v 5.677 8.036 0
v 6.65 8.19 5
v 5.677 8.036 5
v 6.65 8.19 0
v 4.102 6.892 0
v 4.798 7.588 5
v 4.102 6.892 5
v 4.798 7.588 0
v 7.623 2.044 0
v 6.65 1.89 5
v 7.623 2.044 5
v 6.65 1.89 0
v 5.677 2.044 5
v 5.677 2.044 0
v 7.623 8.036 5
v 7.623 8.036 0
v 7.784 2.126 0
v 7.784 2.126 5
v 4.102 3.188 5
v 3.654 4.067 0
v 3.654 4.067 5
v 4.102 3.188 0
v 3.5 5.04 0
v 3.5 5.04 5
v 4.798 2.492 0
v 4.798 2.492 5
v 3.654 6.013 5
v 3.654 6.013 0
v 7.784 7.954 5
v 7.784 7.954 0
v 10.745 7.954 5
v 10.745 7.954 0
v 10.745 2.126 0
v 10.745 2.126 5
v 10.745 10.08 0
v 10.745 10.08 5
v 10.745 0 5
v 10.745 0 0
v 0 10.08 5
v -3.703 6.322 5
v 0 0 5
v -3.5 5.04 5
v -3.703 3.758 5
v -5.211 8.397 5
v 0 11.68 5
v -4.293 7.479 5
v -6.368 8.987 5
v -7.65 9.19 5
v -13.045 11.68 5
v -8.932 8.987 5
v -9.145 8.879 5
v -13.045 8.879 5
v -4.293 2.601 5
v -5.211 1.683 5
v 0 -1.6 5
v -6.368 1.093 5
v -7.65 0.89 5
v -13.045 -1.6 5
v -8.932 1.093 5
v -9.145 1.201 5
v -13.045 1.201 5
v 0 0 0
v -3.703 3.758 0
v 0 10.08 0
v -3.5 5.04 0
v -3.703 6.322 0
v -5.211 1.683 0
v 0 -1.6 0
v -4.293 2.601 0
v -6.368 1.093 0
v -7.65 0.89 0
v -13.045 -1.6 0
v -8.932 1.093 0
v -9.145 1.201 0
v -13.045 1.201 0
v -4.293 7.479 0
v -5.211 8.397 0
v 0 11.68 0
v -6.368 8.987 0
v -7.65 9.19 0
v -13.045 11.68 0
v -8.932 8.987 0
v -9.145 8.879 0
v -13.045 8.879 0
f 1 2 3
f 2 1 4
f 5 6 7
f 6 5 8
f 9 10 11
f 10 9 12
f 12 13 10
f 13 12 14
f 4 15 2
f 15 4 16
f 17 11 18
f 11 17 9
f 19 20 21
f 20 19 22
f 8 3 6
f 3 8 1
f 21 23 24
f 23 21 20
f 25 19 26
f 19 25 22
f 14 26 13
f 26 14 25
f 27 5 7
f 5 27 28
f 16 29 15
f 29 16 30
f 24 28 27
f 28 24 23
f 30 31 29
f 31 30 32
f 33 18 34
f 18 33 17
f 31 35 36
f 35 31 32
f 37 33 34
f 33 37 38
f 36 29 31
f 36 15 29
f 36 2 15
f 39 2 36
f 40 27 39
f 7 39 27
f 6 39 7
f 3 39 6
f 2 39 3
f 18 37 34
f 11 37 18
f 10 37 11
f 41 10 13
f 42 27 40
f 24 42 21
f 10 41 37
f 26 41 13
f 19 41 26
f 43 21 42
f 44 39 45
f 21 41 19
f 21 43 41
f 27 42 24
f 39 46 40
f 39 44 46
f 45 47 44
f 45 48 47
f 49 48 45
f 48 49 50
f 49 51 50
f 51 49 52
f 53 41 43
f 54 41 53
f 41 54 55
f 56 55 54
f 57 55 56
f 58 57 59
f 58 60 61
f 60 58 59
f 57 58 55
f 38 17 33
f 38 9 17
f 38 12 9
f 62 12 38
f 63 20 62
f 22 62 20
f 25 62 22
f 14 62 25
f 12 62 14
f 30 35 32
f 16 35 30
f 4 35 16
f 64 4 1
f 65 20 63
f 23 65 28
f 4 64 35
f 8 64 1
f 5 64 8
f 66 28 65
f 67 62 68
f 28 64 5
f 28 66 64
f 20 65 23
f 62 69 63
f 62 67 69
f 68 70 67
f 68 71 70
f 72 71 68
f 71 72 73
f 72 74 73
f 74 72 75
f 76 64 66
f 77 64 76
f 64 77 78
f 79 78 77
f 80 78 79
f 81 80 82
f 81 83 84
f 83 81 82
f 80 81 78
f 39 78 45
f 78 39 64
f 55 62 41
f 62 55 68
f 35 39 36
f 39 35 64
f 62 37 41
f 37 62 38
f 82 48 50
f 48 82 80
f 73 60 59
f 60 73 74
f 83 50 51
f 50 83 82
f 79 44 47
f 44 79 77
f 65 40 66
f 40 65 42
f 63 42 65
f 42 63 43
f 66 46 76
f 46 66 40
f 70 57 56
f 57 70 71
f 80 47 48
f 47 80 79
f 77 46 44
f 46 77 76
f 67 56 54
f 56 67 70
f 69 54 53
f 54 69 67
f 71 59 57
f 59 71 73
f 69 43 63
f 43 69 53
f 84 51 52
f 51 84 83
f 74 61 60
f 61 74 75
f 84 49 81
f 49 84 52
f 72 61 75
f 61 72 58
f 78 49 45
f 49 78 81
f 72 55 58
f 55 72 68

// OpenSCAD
// diameter of the first or smaller chord
diameter1 = 6;

// diameter of the second or larger chord
diameter2 = 8;

// spacing between the 2 chords
offsetVal = 7;

// Thickness of part
thickness = 5;

// Thickness of bending snap fit
clampthickness = 3.2;

// Tightness of fit
fitVal = 3; // [1,2,3,4,5,6,7,8,9,10]

// adds an tolerance for over-sizing
OversizeTolerance = 0.3;

tightness = 2-(fitVal/20);
radius1 = (diameter1+OversizeTolerance)/2;
radius2 = (diameter2+OversizeTolerance)/2;
offset1 = offsetVal/2;

module build1(radius,offset) {
    difference() {
        cubeWidth = clampthickness*radius;
        cubeLength = offset + (2.3*radius);
        union() {
            cube([cubeLength,cubeWidth,thickness], false);
        }
        scale([1,1,2]) translate([0,0,-thickness*0.25])
        union() {
            $fn = 20;
            translate([offset+(radius),cubeWidth/2,0])
                cylinder(h = thickness, r = radius, center = false);

            translate([(offset+radius),(clampthickness-tightness)*radius/2,0])
                cube([2*radius,tightness*radius,thickness],false);
        }
    }
}

module chordLock(r1,r2,o1) {
    // this calculates the value for centering
    // the mirrored part
    alignOffset = (clampthickness*abs(r1-r2)/2);

    // this builds the first half
    build1(r1,o1);

    // this mirrors the second half
    mirror([1,0,0]) translate([0,-alignOffset,0])
    build1(r2,o1);
}

chordLock(radius1,radius2,offset1);
